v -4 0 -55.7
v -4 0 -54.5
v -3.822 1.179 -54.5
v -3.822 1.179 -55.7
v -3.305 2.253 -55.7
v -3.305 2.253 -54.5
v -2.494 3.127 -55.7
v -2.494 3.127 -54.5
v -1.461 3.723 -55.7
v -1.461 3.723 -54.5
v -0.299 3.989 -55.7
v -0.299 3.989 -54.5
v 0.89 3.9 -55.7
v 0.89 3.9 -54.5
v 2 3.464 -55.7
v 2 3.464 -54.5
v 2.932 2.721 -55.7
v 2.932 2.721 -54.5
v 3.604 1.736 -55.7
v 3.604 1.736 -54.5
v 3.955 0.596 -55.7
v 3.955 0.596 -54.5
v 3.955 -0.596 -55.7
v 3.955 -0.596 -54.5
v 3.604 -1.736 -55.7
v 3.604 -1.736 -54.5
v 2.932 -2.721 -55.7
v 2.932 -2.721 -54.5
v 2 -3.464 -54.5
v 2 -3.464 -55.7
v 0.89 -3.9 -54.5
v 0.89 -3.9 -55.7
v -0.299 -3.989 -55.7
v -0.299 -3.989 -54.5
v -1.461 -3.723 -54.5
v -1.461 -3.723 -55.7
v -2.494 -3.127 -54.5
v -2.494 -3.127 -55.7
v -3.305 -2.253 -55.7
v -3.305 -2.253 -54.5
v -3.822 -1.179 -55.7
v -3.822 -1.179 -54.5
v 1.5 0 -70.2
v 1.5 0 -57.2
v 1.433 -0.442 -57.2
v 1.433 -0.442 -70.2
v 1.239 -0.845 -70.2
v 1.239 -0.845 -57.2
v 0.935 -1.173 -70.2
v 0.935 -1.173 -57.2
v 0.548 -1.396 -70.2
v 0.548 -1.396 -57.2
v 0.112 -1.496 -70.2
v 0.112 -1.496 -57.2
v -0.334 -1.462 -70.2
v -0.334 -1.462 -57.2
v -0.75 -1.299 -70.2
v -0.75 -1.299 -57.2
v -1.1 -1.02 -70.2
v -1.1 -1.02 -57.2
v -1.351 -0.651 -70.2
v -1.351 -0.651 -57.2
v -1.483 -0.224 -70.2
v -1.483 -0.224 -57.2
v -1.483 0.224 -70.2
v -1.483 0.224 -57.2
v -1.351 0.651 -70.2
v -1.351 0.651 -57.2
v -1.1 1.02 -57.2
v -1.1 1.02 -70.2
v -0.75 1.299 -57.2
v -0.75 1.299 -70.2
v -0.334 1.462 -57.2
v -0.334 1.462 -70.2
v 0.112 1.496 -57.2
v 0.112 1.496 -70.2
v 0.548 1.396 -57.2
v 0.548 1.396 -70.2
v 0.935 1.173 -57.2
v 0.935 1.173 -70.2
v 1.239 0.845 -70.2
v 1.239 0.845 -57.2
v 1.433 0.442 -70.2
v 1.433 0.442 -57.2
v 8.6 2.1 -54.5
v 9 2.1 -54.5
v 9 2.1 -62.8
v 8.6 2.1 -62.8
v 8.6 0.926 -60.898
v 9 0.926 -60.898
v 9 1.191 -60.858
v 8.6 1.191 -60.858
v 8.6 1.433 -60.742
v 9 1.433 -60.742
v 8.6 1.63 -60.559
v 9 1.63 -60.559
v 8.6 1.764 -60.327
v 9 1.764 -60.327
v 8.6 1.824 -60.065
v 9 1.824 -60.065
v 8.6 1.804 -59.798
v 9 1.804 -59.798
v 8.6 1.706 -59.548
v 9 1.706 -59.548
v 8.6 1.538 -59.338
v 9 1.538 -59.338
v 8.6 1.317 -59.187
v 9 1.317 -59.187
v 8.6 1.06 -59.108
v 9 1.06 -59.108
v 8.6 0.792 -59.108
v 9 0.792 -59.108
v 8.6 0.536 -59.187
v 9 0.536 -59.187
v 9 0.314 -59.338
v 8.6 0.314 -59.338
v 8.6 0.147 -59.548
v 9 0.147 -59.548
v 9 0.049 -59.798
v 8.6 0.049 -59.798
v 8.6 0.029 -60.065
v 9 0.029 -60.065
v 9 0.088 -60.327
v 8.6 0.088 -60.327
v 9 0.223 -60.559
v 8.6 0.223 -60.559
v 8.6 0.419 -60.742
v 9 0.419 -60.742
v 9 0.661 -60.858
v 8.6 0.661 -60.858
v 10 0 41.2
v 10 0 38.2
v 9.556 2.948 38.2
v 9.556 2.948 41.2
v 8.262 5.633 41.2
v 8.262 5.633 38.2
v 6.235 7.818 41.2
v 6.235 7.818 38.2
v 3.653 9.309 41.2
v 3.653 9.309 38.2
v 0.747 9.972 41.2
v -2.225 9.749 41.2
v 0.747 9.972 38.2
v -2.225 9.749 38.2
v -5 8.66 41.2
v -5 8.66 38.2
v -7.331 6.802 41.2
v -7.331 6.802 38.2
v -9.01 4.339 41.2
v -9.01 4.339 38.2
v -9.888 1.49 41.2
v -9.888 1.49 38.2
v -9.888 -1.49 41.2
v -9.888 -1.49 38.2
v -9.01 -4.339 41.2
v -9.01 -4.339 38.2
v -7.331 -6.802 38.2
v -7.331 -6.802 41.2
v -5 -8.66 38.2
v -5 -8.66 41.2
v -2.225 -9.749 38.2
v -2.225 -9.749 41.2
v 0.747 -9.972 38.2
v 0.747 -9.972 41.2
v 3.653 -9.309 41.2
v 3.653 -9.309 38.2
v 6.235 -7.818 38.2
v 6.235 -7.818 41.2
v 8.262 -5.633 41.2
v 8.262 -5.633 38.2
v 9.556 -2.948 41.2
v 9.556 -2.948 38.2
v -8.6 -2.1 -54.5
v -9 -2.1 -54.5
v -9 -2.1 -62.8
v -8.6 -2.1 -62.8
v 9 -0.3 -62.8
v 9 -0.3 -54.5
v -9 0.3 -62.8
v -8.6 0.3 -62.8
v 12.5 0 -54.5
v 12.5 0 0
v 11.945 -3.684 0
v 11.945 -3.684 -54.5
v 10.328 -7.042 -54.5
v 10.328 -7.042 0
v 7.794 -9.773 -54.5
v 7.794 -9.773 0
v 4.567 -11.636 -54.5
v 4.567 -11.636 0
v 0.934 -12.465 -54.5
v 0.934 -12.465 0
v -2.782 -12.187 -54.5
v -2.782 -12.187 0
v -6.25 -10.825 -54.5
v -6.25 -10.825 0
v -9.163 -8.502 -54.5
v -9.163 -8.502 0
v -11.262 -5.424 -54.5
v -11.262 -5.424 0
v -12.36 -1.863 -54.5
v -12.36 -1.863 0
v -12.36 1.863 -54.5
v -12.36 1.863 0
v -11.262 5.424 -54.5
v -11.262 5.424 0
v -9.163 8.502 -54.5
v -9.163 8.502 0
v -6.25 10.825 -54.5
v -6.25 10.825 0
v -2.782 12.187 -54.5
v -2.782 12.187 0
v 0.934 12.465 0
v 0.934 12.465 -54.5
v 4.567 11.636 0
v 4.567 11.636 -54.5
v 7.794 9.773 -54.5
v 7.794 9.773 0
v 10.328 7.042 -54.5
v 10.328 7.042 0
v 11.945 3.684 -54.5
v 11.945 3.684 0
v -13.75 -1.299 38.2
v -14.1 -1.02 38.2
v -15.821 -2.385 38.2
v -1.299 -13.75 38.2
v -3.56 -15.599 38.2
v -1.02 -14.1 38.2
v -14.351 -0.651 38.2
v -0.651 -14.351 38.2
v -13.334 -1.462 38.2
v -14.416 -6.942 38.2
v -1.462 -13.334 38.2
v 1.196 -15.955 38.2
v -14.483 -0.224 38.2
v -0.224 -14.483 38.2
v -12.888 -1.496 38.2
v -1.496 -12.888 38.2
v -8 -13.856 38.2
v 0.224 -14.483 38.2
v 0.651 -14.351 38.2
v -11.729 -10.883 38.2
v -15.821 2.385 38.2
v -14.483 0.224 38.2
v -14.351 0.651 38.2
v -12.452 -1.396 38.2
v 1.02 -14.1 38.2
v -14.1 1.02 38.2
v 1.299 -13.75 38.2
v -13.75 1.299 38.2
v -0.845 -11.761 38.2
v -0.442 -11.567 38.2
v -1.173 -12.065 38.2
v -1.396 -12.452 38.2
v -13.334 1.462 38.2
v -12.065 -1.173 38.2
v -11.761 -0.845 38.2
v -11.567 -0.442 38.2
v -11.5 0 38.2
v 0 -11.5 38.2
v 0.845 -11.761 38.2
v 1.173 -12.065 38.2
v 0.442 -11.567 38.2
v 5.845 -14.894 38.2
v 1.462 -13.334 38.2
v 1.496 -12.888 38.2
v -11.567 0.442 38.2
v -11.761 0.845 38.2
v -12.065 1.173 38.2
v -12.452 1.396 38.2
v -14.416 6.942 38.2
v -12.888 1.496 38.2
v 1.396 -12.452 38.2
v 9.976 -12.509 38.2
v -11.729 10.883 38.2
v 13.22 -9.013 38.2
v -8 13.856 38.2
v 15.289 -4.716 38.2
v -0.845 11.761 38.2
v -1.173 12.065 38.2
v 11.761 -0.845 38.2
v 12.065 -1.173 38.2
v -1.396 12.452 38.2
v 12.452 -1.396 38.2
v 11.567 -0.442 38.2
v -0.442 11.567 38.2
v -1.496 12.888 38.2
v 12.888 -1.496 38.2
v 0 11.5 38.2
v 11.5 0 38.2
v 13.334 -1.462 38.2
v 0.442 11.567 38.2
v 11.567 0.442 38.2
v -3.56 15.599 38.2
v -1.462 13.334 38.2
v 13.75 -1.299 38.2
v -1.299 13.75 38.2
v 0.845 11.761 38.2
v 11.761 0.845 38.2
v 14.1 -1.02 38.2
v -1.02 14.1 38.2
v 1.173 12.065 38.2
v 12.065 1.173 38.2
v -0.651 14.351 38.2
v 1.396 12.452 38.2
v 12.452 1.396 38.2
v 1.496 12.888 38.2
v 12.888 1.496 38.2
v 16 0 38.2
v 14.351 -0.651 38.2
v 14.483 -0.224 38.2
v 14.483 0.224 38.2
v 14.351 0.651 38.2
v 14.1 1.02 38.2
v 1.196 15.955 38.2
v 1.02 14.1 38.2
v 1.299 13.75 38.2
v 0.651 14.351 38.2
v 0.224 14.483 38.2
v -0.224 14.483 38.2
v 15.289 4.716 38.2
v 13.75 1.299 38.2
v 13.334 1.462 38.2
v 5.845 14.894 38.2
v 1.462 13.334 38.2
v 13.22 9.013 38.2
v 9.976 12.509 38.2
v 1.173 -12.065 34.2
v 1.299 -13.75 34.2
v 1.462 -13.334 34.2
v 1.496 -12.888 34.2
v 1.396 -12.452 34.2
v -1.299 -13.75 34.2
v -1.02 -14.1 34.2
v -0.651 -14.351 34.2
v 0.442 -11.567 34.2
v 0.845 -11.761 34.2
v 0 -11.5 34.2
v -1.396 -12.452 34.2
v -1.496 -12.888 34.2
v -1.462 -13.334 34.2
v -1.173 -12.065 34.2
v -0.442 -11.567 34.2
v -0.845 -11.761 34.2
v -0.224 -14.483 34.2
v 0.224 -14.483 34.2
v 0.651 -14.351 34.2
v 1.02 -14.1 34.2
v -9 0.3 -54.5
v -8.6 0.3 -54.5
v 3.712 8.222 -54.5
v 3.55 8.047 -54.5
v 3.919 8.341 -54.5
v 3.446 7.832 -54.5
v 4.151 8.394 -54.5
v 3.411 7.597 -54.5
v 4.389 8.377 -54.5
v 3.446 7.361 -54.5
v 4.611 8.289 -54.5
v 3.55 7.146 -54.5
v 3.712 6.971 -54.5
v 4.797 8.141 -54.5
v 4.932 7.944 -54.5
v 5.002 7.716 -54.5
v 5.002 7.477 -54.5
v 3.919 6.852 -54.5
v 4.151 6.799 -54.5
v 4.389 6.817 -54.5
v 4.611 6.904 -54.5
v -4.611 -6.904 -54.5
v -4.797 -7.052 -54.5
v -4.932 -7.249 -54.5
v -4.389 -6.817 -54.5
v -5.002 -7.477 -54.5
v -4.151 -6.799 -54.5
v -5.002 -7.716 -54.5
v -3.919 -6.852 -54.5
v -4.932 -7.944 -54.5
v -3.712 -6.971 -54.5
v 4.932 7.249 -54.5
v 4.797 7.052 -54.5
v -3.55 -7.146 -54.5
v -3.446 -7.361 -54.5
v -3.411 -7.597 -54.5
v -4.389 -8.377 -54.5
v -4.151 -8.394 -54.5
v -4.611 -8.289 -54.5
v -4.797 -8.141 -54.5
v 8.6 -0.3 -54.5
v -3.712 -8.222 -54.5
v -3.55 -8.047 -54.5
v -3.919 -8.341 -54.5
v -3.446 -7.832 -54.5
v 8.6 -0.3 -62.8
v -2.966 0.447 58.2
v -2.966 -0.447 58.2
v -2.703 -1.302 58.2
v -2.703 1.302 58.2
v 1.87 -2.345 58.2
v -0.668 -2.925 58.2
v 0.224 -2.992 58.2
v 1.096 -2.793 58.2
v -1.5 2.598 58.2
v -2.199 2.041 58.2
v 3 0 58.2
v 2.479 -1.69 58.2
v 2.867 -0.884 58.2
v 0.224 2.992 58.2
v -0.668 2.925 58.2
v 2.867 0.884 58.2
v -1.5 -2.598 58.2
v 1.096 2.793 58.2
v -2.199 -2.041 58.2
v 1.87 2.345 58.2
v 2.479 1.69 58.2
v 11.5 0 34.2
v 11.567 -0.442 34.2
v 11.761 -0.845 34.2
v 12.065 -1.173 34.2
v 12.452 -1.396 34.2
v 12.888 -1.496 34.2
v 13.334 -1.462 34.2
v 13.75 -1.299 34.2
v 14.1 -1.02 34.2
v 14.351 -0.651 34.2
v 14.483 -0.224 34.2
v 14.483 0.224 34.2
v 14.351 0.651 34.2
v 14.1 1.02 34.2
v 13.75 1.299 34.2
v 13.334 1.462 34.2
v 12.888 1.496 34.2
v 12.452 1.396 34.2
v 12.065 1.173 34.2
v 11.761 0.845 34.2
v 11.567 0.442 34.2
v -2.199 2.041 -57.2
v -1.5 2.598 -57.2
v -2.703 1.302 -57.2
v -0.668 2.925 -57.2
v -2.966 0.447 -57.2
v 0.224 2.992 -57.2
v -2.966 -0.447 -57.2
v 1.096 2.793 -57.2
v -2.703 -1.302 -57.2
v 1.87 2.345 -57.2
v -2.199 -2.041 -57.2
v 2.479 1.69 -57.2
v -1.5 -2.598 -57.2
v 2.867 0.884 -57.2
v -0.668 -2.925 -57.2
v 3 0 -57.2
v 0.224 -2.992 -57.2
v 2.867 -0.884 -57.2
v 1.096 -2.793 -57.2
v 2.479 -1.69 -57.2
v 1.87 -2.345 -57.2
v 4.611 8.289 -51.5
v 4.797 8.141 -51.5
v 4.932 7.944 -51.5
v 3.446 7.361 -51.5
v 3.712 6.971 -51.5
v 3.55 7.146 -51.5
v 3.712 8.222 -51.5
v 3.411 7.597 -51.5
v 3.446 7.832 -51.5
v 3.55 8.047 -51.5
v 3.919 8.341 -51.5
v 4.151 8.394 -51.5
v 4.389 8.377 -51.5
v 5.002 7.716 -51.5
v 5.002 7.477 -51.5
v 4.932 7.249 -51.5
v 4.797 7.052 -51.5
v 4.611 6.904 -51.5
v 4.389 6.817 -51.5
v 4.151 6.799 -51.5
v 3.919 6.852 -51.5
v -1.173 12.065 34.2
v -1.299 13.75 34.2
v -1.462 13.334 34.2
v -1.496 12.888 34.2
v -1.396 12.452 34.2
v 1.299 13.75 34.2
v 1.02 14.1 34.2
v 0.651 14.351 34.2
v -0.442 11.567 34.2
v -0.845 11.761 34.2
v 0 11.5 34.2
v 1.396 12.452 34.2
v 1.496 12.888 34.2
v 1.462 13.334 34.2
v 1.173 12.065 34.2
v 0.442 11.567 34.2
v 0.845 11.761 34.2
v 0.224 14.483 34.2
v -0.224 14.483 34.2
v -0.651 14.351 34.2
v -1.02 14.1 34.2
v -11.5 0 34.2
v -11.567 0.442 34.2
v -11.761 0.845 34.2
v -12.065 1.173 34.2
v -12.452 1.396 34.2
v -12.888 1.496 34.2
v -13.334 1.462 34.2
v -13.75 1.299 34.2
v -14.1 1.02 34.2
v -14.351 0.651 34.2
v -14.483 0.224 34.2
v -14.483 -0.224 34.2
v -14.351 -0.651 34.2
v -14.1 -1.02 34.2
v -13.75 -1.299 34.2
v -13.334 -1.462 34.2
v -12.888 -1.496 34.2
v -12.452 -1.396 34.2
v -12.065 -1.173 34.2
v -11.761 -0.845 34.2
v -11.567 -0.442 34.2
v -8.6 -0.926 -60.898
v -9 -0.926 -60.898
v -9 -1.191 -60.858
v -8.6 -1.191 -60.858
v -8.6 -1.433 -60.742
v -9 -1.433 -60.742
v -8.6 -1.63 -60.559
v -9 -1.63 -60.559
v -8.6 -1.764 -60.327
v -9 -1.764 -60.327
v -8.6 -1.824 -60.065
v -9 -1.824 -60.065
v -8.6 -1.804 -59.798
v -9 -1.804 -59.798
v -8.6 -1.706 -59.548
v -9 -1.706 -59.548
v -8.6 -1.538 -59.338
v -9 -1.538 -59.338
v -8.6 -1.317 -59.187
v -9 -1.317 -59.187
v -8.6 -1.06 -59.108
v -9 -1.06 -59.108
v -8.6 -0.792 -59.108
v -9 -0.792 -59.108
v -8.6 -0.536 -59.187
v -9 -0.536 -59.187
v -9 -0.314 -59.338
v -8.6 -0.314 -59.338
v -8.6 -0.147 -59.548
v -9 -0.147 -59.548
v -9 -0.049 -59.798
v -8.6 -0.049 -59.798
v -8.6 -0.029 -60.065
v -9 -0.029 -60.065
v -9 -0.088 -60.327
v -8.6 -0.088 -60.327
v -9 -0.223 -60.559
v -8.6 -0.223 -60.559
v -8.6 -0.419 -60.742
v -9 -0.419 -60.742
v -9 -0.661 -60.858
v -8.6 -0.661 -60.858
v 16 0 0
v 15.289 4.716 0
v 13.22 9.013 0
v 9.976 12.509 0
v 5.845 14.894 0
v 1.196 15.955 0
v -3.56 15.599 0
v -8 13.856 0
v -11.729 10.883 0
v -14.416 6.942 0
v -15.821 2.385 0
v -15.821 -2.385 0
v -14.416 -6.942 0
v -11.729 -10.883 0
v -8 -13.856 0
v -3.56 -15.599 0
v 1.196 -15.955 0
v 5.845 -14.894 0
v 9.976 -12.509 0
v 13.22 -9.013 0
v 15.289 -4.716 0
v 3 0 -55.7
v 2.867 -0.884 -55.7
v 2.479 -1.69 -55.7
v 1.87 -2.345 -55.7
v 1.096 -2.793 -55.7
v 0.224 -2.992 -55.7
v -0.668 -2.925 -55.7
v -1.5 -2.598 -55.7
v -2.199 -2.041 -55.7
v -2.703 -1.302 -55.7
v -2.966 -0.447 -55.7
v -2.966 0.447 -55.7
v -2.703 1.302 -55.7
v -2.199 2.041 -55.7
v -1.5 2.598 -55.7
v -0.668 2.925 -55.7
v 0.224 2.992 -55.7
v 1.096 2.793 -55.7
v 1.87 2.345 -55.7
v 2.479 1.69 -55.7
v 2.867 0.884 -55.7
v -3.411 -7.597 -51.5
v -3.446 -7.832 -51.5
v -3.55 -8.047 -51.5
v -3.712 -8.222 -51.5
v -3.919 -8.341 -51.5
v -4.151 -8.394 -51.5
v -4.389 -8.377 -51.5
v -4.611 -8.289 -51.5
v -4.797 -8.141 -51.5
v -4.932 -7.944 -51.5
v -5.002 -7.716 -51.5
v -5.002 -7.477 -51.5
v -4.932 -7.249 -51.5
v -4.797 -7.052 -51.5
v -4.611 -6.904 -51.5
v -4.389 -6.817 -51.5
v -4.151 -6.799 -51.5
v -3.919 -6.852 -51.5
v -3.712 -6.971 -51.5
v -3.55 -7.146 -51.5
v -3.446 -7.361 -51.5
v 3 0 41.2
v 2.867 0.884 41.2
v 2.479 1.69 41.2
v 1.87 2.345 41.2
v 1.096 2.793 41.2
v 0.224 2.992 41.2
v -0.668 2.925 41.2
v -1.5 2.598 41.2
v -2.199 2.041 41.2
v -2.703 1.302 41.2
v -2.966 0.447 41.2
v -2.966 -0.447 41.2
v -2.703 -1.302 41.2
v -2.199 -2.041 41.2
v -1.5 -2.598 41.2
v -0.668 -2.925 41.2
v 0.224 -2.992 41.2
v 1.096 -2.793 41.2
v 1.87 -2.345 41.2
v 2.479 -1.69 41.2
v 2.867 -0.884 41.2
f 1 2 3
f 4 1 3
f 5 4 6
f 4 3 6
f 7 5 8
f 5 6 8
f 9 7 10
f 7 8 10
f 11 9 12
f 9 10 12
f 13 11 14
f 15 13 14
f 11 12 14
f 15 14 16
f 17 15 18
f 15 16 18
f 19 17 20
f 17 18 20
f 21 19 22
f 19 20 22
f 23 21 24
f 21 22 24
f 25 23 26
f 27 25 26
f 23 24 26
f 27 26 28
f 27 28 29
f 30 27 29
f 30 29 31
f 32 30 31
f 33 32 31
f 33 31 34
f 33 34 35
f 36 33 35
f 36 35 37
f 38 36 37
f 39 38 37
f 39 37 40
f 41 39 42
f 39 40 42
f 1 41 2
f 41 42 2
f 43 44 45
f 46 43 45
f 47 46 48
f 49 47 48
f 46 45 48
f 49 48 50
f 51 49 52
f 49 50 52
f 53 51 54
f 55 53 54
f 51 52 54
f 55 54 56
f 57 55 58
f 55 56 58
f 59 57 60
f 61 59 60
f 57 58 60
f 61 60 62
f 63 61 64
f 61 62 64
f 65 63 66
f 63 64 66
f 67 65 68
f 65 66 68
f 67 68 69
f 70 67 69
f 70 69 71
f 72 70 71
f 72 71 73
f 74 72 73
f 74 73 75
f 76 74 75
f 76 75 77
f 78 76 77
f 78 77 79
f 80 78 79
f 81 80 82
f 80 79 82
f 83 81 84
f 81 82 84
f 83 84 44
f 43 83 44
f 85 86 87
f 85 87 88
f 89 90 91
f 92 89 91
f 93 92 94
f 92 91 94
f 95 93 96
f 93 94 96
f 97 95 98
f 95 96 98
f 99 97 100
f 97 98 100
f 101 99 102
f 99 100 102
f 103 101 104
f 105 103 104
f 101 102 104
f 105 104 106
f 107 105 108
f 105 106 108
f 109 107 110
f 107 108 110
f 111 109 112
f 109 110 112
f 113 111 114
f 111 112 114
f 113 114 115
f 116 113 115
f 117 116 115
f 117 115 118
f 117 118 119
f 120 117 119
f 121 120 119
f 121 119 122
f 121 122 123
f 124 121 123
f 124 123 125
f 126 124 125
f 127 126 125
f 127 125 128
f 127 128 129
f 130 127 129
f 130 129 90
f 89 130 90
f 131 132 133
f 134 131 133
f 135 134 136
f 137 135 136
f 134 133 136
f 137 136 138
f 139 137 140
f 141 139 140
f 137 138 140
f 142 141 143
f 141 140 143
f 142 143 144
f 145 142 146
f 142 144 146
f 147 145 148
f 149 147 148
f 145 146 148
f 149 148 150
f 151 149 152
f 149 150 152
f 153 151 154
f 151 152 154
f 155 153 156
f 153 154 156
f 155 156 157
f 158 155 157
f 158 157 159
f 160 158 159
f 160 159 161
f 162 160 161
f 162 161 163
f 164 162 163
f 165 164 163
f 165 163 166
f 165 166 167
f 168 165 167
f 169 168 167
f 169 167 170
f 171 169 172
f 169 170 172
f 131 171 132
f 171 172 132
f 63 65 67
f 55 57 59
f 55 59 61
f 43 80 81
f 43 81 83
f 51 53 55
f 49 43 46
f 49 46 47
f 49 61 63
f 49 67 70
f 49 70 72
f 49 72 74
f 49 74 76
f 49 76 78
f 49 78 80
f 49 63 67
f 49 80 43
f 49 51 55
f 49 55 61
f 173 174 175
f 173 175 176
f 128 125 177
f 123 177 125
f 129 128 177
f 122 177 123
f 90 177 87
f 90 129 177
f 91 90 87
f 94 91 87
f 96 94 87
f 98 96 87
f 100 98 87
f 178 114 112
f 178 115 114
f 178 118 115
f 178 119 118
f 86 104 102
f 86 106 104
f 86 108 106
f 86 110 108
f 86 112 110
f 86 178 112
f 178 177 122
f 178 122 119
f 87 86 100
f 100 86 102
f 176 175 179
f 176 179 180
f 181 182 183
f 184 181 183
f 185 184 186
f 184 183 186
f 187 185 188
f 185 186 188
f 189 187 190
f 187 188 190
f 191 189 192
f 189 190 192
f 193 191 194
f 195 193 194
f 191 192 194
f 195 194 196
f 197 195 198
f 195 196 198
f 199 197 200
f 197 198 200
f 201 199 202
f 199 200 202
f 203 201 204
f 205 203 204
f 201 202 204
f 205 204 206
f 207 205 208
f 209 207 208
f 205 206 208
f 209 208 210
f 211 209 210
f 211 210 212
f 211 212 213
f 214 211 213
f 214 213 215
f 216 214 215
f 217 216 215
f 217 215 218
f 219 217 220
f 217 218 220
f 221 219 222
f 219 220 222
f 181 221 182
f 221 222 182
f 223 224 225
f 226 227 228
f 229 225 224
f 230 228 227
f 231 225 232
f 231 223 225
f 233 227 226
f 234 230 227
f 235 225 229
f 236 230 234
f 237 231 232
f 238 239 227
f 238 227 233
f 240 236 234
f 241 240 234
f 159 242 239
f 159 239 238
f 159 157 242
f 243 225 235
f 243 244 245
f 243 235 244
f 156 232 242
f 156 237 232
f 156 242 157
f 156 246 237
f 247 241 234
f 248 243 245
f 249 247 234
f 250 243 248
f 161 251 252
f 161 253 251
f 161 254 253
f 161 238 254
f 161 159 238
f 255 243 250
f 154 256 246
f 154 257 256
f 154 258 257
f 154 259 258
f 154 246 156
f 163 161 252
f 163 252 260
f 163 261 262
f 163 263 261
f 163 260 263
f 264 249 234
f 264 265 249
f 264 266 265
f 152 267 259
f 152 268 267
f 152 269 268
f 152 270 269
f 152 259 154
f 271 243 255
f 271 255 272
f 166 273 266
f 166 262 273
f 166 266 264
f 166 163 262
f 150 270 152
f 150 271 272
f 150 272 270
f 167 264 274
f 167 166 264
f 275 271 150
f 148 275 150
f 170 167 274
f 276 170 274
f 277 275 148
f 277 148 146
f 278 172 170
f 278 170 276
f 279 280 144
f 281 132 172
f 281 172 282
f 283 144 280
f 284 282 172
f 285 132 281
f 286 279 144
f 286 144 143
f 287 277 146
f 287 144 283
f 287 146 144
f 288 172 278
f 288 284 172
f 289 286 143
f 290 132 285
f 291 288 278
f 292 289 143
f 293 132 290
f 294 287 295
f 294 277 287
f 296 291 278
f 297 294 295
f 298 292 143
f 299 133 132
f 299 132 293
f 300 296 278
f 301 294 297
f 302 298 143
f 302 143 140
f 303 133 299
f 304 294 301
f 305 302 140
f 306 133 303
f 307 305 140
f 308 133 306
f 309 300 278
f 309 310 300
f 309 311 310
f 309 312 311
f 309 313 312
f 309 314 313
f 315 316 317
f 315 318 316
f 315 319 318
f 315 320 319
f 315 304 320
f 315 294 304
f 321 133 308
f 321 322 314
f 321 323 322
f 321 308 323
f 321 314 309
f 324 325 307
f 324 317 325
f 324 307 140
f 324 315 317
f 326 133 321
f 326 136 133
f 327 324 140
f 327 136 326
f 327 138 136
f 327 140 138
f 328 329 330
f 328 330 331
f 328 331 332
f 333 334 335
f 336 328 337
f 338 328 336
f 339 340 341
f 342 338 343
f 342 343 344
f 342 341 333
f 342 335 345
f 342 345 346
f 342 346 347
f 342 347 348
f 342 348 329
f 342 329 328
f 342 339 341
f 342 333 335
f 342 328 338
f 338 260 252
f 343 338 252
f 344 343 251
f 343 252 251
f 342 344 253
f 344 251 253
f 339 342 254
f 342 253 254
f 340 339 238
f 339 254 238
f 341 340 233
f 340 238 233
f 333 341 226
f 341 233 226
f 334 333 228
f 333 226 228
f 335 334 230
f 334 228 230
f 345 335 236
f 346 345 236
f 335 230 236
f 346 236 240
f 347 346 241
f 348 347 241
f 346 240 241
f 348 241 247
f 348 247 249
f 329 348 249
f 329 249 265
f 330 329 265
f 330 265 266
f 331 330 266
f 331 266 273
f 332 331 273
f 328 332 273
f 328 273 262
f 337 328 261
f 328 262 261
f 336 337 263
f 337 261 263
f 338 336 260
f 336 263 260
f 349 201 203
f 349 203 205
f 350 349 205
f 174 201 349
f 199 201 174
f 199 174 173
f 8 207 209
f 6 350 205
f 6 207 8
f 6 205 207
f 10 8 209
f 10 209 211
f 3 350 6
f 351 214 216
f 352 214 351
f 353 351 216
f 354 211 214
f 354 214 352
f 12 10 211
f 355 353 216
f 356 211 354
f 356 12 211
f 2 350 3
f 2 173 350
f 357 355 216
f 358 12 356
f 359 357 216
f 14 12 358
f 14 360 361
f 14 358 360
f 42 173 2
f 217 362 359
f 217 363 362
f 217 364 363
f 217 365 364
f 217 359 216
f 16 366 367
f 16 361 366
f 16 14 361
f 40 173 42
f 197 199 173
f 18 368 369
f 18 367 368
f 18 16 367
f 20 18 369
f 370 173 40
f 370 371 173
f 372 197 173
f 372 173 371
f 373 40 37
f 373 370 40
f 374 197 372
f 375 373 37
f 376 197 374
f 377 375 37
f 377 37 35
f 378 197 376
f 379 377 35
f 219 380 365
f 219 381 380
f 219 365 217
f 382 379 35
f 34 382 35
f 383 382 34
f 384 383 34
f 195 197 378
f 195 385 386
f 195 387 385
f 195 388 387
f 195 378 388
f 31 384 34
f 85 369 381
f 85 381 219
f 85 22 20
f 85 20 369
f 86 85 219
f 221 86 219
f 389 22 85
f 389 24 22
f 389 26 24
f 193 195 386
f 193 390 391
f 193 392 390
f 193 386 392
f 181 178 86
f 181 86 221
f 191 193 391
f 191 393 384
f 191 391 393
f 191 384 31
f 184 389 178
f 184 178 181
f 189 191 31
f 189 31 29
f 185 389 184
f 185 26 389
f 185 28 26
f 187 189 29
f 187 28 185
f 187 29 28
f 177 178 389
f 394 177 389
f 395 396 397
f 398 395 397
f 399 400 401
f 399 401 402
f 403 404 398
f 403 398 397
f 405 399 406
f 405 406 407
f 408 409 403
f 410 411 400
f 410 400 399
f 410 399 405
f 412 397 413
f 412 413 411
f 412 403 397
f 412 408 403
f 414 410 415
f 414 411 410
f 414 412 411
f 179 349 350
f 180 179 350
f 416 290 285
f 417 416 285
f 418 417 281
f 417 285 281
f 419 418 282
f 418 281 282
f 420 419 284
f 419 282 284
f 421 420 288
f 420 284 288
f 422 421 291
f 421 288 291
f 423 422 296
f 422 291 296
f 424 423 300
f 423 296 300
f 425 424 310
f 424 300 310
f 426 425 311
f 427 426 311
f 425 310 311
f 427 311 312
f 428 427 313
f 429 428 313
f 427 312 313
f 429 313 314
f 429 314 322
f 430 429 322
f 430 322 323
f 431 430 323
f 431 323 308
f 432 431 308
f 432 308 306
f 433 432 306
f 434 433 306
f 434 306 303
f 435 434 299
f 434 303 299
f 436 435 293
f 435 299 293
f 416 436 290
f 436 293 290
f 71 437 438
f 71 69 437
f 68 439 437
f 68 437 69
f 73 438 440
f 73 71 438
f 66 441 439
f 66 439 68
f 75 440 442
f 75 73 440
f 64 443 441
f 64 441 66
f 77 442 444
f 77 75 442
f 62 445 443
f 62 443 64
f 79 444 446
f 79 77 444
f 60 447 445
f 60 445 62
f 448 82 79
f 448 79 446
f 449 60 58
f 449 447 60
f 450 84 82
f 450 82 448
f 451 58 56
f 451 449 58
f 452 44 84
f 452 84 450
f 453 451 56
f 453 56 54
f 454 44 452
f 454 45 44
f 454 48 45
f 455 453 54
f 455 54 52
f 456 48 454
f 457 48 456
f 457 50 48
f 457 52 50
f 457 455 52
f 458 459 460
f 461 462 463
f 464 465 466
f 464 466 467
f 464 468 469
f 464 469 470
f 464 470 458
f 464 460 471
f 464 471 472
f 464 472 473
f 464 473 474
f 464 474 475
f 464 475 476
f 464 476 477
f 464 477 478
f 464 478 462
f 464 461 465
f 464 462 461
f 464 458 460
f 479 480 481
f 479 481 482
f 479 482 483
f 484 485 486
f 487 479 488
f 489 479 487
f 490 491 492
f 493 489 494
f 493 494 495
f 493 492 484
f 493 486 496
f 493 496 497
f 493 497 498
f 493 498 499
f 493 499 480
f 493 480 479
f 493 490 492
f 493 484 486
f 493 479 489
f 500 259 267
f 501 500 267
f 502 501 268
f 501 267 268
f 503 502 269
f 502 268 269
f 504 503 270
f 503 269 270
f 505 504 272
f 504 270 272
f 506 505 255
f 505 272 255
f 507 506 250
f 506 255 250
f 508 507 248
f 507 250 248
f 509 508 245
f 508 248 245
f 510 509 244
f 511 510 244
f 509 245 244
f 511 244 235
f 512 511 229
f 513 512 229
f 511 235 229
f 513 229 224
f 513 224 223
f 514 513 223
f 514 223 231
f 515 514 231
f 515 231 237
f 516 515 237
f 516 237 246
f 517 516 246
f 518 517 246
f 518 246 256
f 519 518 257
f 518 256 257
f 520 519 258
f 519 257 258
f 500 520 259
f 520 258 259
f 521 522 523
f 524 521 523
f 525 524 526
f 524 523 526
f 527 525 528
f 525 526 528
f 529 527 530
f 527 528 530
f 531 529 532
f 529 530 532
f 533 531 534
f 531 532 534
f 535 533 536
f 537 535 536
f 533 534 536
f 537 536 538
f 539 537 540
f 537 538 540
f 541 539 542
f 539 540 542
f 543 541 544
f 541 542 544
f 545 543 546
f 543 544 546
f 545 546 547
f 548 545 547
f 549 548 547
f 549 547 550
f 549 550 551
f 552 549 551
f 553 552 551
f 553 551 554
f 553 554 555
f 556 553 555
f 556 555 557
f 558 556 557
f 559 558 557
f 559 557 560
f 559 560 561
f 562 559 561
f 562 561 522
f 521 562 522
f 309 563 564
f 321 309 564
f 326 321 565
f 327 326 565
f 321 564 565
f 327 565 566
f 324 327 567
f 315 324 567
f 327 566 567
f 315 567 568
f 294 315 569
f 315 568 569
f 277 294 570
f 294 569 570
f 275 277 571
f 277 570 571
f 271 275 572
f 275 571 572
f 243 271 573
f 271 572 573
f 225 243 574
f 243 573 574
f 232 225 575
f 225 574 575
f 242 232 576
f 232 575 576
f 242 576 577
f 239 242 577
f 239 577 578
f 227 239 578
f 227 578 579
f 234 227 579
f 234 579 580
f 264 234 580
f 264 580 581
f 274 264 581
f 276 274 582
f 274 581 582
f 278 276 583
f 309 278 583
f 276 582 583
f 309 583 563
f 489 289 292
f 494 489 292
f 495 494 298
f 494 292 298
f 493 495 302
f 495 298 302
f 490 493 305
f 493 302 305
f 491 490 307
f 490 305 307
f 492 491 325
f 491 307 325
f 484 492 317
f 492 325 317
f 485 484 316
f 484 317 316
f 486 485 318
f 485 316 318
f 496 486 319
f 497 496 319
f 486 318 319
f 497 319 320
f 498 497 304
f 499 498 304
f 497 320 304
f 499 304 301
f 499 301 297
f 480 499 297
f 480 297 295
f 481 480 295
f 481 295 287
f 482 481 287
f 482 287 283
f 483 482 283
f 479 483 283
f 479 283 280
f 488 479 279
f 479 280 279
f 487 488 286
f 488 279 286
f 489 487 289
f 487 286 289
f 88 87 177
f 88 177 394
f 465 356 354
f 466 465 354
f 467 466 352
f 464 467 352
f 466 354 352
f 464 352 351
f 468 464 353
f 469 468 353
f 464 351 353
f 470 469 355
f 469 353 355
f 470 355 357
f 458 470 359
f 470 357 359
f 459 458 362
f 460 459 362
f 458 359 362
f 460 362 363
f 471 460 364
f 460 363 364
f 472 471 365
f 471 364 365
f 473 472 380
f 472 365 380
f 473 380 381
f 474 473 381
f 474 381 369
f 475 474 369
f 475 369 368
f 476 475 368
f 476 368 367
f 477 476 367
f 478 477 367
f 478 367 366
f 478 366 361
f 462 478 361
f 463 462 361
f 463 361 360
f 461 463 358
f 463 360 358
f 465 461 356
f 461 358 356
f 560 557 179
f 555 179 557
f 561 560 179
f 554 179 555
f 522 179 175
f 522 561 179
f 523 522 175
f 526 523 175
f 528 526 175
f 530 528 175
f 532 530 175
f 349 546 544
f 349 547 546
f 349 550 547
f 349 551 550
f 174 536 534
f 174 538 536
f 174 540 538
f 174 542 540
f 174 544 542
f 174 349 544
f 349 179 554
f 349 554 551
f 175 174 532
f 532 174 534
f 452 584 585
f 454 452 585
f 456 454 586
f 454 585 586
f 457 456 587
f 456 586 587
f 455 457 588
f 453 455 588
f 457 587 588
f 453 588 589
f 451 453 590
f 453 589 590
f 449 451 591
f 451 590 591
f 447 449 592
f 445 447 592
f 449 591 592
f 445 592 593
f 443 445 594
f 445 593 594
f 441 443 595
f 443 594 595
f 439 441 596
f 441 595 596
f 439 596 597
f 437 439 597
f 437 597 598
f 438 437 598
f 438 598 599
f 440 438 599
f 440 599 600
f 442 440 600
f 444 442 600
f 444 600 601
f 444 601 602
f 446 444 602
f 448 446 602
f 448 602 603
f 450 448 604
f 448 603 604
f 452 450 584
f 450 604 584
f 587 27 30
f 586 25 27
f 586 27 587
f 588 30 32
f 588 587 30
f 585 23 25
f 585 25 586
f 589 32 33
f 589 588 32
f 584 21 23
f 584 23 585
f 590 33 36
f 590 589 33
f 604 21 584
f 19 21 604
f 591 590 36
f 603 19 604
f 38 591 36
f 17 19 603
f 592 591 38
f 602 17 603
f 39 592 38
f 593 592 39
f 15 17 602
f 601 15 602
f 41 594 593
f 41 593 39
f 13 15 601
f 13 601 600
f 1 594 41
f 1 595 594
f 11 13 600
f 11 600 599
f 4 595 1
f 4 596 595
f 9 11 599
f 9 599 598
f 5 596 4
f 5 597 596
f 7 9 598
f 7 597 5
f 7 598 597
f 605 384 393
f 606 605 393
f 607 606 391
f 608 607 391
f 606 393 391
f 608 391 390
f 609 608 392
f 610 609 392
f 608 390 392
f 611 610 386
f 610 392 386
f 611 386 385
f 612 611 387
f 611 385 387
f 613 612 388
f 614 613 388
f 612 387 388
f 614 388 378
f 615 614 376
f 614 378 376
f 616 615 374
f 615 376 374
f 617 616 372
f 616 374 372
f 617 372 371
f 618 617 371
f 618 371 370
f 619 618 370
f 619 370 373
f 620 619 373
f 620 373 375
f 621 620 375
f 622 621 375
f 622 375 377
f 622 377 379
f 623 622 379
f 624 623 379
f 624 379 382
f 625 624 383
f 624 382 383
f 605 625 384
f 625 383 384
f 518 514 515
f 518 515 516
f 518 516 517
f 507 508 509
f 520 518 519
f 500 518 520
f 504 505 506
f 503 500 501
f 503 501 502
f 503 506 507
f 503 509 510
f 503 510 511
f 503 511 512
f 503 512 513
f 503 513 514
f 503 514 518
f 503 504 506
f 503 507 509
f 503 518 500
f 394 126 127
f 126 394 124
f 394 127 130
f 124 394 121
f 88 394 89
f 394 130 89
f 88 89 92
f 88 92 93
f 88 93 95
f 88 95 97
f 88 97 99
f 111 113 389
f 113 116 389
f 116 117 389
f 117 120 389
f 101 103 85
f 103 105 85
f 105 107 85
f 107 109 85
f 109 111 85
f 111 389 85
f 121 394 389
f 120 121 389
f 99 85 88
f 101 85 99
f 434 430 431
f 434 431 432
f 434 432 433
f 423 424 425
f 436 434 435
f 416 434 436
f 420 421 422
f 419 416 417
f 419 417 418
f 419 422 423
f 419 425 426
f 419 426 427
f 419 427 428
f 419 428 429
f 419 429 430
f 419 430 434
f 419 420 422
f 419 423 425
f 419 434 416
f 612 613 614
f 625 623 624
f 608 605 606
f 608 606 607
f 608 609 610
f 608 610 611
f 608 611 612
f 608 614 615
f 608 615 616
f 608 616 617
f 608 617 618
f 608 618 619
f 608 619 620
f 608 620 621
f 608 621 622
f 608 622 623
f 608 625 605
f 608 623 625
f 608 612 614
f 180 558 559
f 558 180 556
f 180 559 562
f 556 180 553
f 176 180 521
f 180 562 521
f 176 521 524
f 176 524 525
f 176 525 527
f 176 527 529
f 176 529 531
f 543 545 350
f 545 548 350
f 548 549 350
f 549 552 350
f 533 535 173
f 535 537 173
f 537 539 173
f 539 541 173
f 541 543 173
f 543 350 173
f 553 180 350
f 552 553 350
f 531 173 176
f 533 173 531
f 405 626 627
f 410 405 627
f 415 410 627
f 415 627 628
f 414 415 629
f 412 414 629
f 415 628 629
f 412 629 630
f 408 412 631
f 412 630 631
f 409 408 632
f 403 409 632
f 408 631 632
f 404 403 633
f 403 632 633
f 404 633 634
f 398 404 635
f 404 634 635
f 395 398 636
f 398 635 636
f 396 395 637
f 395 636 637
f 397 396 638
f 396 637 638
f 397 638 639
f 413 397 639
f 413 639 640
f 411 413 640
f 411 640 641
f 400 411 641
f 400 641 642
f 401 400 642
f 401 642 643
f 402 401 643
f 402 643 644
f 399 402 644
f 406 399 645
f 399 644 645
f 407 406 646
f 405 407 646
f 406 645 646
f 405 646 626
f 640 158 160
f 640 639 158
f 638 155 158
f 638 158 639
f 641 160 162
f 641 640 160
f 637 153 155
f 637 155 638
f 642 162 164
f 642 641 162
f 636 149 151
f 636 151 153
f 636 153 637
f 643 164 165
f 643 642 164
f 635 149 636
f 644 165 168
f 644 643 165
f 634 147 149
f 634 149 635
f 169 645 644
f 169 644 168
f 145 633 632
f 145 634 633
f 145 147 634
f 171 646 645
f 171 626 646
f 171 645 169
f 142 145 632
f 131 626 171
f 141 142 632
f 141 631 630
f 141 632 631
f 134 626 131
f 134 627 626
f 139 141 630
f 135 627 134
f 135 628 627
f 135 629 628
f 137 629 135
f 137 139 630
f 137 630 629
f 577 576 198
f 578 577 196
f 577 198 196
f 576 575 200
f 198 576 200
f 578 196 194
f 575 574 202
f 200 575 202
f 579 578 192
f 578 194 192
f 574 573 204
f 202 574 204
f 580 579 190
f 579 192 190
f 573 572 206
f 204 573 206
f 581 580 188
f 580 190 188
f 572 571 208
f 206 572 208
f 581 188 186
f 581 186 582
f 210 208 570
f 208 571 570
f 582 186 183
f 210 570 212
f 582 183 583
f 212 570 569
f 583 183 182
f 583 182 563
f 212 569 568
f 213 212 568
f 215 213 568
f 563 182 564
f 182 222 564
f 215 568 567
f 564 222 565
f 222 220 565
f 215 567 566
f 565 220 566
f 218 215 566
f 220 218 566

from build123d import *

# Parameters (mm, degrees)
ESQUISSE1_R                  = 16
BOSS_EXTRU_1_DEPTH           = 38.2
ESQUISSE4_R                  = 12.5
BOSS_EXTRU_2_DEPTH           = 54.5
ESQUISSE5_R                  = 10
BOSS_EXTRU_3_DEPTH           = 3
ESQUISSE6_R                  = 3
BOSS_EXTRU_4_DEPTH           = 17
ESQUISSE8_R                  = 4
BOSS_EXTRU_5_DEPTH           = 1.2
ESQUISSE9_R                  = 3
BOSS_EXTRU_6_DEPTH           = 1.5
ESQUISSE10_R                 = 1.5
BOSS_EXTRU_7_DEPTH           = 13
ESQUISSE11_W                 = 0.4
ESQUISSE11_H                 = 2.4
BOSS_EXTRU_8_DEPTH           = 8.3
ESQUISSE14_R                 = 0.9
ENL_V_MAT_EXTRU_2_DEPTH      = 1
R_P_TITION_CIRCULAIRE3_COUNT = 2
R_P_TITION_CIRCULAIRE4_COUNT = 2
ESQUISSE15_R                 = 0.8
ENL_V_MAT_EXTRU_3_DEPTH      = 3
R_P_TITION_CIRCULAIRE5_COUNT = 2
ESQUISSE16_R                 = 1.5
ENL_V_MAT_EXTRU_4_DEPTH      = 4
R_P_TITION_CIRCULAIRE6_COUNT = 4


with BuildPart() as part:
    # Esquisse1 → Boss.-Extru.1 (new body)
    with BuildSketch(Plane.XY):
        Circle(ESQUISSE1_R)
    extrude(amount=BOSS_EXTRU_1_DEPTH)

    # Esquisse4 → Boss.-Extru.2 (add)
    with BuildSketch(Plane(origin=(0, 0, 0), x_dir=(-1, 0, 0), z_dir=(0, 0, -1))):
        with Locations(Location((0, 0, 0), (0, 0, 180))):
            Circle(ESQUISSE4_R)
    extrude(amount=BOSS_EXTRU_2_DEPTH)

    # Esquisse5 → Boss.-Extru.3 (add)
    with BuildSketch(Plane.XY.offset(38.2)):
        Circle(ESQUISSE5_R)
    extrude(amount=BOSS_EXTRU_3_DEPTH)

    # Esquisse6 → Boss.-Extru.4 (add)
    with BuildSketch(Plane.XY.offset(41.2)):
        Circle(ESQUISSE6_R)
    extrude(amount=BOSS_EXTRU_4_DEPTH)

    # Esquisse8 → Boss.-Extru.5 (add)
    with BuildSketch(Plane(origin=(0, 0, -54.5), x_dir=(-1, 0, 0), z_dir=(0, 0, -1))):
        Circle(ESQUISSE8_R)
    extrude(amount=BOSS_EXTRU_5_DEPTH)

    # Esquisse9 → Boss.-Extru.6 (add)
    with BuildSketch(Plane(origin=(0, 0, -55.7), x_dir=(-1, 0, 0), z_dir=(0, 0, -1))):
        with Locations(Location((0, 0, 0), (0, 0, 180))):
            Circle(ESQUISSE9_R)
    extrude(amount=BOSS_EXTRU_6_DEPTH)

    # Esquisse10 → Boss.-Extru.7 (add)
    with BuildSketch(Plane(origin=(0, 0, -57.2), x_dir=(-1, 0, 0), z_dir=(0, 0, -1))):
        with Locations(Location((0, 0, 0), (0, 0, 180))):
            Circle(ESQUISSE10_R)
    extrude(amount=BOSS_EXTRU_7_DEPTH)

    # Esquisse11 → Boss.-Extru.8 (add)
    with BuildSketch(Plane(origin=(0, 0, -54.5), x_dir=(-1, 0, 0), z_dir=(0, 0, -1))):
        with Locations((-8.8, 0.9)):
            Rectangle(ESQUISSE11_W, ESQUISSE11_H)
    boss_extru_8 = extrude(amount=BOSS_EXTRU_8_DEPTH)

    # Esquisse14 → Enlèv. mat.-Extru.2 (cut)
    with BuildSketch(Plane(origin=(9, 0, 0), x_dir=(0, 0, -1), z_dir=(1, 0, 0))):
        with Locations((59.997923429, 0.92616233)):
            Circle(ESQUISSE14_R)
    enl_v_mat_extru_2 = extrude(amount=-ENL_V_MAT_EXTRU_2_DEPTH, mode=Mode.SUBTRACT)

    # Répétition circulaire3: Boss.-Extru.8 ×2 about axis
    r_p_tition_circulaire3_axis = Axis((0, 0, 0), (0, 0, 1))
    for i in range(1, R_P_TITION_CIRCULAIRE3_COUNT):
        add(boss_extru_8.rotate(r_p_tition_circulaire3_axis, i * 360 / R_P_TITION_CIRCULAIRE3_COUNT))

    # Répétition circulaire4: Enlèv. mat.-Extru.2 ×2 about axis
    r_p_tition_circulaire4_axis = Axis((0, 0, -70.2), (0, 0, 1))
    for i in range(1, R_P_TITION_CIRCULAIRE4_COUNT):
        add(enl_v_mat_extru_2.rotate(r_p_tition_circulaire4_axis, i * 360 / R_P_TITION_CIRCULAIRE4_COUNT), mode=Mode.SUBTRACT)

    # Esquisse15 → Enlèv. mat.-Extru.3 (cut)
    with BuildSketch(Plane(origin=(0, 0, -54.5), x_dir=(-1, 0, 0), z_dir=(0, 0, -1))):
        with Locations((-4.210841648, 7.596559423)):
            Circle(ESQUISSE15_R)
    enl_v_mat_extru_3 = extrude(amount=-ENL_V_MAT_EXTRU_3_DEPTH, mode=Mode.SUBTRACT)

    # Répétition circulaire5: Enlèv. mat.-Extru.3 ×2 about axis
    r_p_tition_circulaire5_axis = Axis((0, 0, 0), (0, 0, 1))
    for i in range(1, R_P_TITION_CIRCULAIRE5_COUNT):
        add(enl_v_mat_extru_3.rotate(r_p_tition_circulaire5_axis, i * 360 / R_P_TITION_CIRCULAIRE5_COUNT), mode=Mode.SUBTRACT)

    # Esquisse16 → Enlèv. mat.-Extru.4 (cut)
    with BuildSketch(Plane.XY.offset(38.2)):
        with Locations((-13, 0)):
            Circle(ESQUISSE16_R)
    enl_v_mat_extru_4 = extrude(amount=-ENL_V_MAT_EXTRU_4_DEPTH, mode=Mode.SUBTRACT)

    # Répétition circulaire6: Enlèv. mat.-Extru.4 ×4 about axis
    r_p_tition_circulaire6_axis = Axis((0, 0, 0), (0, 0, 1))
    for i in range(1, R_P_TITION_CIRCULAIRE6_COUNT):
        add(enl_v_mat_extru_4.rotate(r_p_tition_circulaire6_axis, i * 360 / R_P_TITION_CIRCULAIRE6_COUNT), mode=Mode.SUBTRACT)


solid = part.part
